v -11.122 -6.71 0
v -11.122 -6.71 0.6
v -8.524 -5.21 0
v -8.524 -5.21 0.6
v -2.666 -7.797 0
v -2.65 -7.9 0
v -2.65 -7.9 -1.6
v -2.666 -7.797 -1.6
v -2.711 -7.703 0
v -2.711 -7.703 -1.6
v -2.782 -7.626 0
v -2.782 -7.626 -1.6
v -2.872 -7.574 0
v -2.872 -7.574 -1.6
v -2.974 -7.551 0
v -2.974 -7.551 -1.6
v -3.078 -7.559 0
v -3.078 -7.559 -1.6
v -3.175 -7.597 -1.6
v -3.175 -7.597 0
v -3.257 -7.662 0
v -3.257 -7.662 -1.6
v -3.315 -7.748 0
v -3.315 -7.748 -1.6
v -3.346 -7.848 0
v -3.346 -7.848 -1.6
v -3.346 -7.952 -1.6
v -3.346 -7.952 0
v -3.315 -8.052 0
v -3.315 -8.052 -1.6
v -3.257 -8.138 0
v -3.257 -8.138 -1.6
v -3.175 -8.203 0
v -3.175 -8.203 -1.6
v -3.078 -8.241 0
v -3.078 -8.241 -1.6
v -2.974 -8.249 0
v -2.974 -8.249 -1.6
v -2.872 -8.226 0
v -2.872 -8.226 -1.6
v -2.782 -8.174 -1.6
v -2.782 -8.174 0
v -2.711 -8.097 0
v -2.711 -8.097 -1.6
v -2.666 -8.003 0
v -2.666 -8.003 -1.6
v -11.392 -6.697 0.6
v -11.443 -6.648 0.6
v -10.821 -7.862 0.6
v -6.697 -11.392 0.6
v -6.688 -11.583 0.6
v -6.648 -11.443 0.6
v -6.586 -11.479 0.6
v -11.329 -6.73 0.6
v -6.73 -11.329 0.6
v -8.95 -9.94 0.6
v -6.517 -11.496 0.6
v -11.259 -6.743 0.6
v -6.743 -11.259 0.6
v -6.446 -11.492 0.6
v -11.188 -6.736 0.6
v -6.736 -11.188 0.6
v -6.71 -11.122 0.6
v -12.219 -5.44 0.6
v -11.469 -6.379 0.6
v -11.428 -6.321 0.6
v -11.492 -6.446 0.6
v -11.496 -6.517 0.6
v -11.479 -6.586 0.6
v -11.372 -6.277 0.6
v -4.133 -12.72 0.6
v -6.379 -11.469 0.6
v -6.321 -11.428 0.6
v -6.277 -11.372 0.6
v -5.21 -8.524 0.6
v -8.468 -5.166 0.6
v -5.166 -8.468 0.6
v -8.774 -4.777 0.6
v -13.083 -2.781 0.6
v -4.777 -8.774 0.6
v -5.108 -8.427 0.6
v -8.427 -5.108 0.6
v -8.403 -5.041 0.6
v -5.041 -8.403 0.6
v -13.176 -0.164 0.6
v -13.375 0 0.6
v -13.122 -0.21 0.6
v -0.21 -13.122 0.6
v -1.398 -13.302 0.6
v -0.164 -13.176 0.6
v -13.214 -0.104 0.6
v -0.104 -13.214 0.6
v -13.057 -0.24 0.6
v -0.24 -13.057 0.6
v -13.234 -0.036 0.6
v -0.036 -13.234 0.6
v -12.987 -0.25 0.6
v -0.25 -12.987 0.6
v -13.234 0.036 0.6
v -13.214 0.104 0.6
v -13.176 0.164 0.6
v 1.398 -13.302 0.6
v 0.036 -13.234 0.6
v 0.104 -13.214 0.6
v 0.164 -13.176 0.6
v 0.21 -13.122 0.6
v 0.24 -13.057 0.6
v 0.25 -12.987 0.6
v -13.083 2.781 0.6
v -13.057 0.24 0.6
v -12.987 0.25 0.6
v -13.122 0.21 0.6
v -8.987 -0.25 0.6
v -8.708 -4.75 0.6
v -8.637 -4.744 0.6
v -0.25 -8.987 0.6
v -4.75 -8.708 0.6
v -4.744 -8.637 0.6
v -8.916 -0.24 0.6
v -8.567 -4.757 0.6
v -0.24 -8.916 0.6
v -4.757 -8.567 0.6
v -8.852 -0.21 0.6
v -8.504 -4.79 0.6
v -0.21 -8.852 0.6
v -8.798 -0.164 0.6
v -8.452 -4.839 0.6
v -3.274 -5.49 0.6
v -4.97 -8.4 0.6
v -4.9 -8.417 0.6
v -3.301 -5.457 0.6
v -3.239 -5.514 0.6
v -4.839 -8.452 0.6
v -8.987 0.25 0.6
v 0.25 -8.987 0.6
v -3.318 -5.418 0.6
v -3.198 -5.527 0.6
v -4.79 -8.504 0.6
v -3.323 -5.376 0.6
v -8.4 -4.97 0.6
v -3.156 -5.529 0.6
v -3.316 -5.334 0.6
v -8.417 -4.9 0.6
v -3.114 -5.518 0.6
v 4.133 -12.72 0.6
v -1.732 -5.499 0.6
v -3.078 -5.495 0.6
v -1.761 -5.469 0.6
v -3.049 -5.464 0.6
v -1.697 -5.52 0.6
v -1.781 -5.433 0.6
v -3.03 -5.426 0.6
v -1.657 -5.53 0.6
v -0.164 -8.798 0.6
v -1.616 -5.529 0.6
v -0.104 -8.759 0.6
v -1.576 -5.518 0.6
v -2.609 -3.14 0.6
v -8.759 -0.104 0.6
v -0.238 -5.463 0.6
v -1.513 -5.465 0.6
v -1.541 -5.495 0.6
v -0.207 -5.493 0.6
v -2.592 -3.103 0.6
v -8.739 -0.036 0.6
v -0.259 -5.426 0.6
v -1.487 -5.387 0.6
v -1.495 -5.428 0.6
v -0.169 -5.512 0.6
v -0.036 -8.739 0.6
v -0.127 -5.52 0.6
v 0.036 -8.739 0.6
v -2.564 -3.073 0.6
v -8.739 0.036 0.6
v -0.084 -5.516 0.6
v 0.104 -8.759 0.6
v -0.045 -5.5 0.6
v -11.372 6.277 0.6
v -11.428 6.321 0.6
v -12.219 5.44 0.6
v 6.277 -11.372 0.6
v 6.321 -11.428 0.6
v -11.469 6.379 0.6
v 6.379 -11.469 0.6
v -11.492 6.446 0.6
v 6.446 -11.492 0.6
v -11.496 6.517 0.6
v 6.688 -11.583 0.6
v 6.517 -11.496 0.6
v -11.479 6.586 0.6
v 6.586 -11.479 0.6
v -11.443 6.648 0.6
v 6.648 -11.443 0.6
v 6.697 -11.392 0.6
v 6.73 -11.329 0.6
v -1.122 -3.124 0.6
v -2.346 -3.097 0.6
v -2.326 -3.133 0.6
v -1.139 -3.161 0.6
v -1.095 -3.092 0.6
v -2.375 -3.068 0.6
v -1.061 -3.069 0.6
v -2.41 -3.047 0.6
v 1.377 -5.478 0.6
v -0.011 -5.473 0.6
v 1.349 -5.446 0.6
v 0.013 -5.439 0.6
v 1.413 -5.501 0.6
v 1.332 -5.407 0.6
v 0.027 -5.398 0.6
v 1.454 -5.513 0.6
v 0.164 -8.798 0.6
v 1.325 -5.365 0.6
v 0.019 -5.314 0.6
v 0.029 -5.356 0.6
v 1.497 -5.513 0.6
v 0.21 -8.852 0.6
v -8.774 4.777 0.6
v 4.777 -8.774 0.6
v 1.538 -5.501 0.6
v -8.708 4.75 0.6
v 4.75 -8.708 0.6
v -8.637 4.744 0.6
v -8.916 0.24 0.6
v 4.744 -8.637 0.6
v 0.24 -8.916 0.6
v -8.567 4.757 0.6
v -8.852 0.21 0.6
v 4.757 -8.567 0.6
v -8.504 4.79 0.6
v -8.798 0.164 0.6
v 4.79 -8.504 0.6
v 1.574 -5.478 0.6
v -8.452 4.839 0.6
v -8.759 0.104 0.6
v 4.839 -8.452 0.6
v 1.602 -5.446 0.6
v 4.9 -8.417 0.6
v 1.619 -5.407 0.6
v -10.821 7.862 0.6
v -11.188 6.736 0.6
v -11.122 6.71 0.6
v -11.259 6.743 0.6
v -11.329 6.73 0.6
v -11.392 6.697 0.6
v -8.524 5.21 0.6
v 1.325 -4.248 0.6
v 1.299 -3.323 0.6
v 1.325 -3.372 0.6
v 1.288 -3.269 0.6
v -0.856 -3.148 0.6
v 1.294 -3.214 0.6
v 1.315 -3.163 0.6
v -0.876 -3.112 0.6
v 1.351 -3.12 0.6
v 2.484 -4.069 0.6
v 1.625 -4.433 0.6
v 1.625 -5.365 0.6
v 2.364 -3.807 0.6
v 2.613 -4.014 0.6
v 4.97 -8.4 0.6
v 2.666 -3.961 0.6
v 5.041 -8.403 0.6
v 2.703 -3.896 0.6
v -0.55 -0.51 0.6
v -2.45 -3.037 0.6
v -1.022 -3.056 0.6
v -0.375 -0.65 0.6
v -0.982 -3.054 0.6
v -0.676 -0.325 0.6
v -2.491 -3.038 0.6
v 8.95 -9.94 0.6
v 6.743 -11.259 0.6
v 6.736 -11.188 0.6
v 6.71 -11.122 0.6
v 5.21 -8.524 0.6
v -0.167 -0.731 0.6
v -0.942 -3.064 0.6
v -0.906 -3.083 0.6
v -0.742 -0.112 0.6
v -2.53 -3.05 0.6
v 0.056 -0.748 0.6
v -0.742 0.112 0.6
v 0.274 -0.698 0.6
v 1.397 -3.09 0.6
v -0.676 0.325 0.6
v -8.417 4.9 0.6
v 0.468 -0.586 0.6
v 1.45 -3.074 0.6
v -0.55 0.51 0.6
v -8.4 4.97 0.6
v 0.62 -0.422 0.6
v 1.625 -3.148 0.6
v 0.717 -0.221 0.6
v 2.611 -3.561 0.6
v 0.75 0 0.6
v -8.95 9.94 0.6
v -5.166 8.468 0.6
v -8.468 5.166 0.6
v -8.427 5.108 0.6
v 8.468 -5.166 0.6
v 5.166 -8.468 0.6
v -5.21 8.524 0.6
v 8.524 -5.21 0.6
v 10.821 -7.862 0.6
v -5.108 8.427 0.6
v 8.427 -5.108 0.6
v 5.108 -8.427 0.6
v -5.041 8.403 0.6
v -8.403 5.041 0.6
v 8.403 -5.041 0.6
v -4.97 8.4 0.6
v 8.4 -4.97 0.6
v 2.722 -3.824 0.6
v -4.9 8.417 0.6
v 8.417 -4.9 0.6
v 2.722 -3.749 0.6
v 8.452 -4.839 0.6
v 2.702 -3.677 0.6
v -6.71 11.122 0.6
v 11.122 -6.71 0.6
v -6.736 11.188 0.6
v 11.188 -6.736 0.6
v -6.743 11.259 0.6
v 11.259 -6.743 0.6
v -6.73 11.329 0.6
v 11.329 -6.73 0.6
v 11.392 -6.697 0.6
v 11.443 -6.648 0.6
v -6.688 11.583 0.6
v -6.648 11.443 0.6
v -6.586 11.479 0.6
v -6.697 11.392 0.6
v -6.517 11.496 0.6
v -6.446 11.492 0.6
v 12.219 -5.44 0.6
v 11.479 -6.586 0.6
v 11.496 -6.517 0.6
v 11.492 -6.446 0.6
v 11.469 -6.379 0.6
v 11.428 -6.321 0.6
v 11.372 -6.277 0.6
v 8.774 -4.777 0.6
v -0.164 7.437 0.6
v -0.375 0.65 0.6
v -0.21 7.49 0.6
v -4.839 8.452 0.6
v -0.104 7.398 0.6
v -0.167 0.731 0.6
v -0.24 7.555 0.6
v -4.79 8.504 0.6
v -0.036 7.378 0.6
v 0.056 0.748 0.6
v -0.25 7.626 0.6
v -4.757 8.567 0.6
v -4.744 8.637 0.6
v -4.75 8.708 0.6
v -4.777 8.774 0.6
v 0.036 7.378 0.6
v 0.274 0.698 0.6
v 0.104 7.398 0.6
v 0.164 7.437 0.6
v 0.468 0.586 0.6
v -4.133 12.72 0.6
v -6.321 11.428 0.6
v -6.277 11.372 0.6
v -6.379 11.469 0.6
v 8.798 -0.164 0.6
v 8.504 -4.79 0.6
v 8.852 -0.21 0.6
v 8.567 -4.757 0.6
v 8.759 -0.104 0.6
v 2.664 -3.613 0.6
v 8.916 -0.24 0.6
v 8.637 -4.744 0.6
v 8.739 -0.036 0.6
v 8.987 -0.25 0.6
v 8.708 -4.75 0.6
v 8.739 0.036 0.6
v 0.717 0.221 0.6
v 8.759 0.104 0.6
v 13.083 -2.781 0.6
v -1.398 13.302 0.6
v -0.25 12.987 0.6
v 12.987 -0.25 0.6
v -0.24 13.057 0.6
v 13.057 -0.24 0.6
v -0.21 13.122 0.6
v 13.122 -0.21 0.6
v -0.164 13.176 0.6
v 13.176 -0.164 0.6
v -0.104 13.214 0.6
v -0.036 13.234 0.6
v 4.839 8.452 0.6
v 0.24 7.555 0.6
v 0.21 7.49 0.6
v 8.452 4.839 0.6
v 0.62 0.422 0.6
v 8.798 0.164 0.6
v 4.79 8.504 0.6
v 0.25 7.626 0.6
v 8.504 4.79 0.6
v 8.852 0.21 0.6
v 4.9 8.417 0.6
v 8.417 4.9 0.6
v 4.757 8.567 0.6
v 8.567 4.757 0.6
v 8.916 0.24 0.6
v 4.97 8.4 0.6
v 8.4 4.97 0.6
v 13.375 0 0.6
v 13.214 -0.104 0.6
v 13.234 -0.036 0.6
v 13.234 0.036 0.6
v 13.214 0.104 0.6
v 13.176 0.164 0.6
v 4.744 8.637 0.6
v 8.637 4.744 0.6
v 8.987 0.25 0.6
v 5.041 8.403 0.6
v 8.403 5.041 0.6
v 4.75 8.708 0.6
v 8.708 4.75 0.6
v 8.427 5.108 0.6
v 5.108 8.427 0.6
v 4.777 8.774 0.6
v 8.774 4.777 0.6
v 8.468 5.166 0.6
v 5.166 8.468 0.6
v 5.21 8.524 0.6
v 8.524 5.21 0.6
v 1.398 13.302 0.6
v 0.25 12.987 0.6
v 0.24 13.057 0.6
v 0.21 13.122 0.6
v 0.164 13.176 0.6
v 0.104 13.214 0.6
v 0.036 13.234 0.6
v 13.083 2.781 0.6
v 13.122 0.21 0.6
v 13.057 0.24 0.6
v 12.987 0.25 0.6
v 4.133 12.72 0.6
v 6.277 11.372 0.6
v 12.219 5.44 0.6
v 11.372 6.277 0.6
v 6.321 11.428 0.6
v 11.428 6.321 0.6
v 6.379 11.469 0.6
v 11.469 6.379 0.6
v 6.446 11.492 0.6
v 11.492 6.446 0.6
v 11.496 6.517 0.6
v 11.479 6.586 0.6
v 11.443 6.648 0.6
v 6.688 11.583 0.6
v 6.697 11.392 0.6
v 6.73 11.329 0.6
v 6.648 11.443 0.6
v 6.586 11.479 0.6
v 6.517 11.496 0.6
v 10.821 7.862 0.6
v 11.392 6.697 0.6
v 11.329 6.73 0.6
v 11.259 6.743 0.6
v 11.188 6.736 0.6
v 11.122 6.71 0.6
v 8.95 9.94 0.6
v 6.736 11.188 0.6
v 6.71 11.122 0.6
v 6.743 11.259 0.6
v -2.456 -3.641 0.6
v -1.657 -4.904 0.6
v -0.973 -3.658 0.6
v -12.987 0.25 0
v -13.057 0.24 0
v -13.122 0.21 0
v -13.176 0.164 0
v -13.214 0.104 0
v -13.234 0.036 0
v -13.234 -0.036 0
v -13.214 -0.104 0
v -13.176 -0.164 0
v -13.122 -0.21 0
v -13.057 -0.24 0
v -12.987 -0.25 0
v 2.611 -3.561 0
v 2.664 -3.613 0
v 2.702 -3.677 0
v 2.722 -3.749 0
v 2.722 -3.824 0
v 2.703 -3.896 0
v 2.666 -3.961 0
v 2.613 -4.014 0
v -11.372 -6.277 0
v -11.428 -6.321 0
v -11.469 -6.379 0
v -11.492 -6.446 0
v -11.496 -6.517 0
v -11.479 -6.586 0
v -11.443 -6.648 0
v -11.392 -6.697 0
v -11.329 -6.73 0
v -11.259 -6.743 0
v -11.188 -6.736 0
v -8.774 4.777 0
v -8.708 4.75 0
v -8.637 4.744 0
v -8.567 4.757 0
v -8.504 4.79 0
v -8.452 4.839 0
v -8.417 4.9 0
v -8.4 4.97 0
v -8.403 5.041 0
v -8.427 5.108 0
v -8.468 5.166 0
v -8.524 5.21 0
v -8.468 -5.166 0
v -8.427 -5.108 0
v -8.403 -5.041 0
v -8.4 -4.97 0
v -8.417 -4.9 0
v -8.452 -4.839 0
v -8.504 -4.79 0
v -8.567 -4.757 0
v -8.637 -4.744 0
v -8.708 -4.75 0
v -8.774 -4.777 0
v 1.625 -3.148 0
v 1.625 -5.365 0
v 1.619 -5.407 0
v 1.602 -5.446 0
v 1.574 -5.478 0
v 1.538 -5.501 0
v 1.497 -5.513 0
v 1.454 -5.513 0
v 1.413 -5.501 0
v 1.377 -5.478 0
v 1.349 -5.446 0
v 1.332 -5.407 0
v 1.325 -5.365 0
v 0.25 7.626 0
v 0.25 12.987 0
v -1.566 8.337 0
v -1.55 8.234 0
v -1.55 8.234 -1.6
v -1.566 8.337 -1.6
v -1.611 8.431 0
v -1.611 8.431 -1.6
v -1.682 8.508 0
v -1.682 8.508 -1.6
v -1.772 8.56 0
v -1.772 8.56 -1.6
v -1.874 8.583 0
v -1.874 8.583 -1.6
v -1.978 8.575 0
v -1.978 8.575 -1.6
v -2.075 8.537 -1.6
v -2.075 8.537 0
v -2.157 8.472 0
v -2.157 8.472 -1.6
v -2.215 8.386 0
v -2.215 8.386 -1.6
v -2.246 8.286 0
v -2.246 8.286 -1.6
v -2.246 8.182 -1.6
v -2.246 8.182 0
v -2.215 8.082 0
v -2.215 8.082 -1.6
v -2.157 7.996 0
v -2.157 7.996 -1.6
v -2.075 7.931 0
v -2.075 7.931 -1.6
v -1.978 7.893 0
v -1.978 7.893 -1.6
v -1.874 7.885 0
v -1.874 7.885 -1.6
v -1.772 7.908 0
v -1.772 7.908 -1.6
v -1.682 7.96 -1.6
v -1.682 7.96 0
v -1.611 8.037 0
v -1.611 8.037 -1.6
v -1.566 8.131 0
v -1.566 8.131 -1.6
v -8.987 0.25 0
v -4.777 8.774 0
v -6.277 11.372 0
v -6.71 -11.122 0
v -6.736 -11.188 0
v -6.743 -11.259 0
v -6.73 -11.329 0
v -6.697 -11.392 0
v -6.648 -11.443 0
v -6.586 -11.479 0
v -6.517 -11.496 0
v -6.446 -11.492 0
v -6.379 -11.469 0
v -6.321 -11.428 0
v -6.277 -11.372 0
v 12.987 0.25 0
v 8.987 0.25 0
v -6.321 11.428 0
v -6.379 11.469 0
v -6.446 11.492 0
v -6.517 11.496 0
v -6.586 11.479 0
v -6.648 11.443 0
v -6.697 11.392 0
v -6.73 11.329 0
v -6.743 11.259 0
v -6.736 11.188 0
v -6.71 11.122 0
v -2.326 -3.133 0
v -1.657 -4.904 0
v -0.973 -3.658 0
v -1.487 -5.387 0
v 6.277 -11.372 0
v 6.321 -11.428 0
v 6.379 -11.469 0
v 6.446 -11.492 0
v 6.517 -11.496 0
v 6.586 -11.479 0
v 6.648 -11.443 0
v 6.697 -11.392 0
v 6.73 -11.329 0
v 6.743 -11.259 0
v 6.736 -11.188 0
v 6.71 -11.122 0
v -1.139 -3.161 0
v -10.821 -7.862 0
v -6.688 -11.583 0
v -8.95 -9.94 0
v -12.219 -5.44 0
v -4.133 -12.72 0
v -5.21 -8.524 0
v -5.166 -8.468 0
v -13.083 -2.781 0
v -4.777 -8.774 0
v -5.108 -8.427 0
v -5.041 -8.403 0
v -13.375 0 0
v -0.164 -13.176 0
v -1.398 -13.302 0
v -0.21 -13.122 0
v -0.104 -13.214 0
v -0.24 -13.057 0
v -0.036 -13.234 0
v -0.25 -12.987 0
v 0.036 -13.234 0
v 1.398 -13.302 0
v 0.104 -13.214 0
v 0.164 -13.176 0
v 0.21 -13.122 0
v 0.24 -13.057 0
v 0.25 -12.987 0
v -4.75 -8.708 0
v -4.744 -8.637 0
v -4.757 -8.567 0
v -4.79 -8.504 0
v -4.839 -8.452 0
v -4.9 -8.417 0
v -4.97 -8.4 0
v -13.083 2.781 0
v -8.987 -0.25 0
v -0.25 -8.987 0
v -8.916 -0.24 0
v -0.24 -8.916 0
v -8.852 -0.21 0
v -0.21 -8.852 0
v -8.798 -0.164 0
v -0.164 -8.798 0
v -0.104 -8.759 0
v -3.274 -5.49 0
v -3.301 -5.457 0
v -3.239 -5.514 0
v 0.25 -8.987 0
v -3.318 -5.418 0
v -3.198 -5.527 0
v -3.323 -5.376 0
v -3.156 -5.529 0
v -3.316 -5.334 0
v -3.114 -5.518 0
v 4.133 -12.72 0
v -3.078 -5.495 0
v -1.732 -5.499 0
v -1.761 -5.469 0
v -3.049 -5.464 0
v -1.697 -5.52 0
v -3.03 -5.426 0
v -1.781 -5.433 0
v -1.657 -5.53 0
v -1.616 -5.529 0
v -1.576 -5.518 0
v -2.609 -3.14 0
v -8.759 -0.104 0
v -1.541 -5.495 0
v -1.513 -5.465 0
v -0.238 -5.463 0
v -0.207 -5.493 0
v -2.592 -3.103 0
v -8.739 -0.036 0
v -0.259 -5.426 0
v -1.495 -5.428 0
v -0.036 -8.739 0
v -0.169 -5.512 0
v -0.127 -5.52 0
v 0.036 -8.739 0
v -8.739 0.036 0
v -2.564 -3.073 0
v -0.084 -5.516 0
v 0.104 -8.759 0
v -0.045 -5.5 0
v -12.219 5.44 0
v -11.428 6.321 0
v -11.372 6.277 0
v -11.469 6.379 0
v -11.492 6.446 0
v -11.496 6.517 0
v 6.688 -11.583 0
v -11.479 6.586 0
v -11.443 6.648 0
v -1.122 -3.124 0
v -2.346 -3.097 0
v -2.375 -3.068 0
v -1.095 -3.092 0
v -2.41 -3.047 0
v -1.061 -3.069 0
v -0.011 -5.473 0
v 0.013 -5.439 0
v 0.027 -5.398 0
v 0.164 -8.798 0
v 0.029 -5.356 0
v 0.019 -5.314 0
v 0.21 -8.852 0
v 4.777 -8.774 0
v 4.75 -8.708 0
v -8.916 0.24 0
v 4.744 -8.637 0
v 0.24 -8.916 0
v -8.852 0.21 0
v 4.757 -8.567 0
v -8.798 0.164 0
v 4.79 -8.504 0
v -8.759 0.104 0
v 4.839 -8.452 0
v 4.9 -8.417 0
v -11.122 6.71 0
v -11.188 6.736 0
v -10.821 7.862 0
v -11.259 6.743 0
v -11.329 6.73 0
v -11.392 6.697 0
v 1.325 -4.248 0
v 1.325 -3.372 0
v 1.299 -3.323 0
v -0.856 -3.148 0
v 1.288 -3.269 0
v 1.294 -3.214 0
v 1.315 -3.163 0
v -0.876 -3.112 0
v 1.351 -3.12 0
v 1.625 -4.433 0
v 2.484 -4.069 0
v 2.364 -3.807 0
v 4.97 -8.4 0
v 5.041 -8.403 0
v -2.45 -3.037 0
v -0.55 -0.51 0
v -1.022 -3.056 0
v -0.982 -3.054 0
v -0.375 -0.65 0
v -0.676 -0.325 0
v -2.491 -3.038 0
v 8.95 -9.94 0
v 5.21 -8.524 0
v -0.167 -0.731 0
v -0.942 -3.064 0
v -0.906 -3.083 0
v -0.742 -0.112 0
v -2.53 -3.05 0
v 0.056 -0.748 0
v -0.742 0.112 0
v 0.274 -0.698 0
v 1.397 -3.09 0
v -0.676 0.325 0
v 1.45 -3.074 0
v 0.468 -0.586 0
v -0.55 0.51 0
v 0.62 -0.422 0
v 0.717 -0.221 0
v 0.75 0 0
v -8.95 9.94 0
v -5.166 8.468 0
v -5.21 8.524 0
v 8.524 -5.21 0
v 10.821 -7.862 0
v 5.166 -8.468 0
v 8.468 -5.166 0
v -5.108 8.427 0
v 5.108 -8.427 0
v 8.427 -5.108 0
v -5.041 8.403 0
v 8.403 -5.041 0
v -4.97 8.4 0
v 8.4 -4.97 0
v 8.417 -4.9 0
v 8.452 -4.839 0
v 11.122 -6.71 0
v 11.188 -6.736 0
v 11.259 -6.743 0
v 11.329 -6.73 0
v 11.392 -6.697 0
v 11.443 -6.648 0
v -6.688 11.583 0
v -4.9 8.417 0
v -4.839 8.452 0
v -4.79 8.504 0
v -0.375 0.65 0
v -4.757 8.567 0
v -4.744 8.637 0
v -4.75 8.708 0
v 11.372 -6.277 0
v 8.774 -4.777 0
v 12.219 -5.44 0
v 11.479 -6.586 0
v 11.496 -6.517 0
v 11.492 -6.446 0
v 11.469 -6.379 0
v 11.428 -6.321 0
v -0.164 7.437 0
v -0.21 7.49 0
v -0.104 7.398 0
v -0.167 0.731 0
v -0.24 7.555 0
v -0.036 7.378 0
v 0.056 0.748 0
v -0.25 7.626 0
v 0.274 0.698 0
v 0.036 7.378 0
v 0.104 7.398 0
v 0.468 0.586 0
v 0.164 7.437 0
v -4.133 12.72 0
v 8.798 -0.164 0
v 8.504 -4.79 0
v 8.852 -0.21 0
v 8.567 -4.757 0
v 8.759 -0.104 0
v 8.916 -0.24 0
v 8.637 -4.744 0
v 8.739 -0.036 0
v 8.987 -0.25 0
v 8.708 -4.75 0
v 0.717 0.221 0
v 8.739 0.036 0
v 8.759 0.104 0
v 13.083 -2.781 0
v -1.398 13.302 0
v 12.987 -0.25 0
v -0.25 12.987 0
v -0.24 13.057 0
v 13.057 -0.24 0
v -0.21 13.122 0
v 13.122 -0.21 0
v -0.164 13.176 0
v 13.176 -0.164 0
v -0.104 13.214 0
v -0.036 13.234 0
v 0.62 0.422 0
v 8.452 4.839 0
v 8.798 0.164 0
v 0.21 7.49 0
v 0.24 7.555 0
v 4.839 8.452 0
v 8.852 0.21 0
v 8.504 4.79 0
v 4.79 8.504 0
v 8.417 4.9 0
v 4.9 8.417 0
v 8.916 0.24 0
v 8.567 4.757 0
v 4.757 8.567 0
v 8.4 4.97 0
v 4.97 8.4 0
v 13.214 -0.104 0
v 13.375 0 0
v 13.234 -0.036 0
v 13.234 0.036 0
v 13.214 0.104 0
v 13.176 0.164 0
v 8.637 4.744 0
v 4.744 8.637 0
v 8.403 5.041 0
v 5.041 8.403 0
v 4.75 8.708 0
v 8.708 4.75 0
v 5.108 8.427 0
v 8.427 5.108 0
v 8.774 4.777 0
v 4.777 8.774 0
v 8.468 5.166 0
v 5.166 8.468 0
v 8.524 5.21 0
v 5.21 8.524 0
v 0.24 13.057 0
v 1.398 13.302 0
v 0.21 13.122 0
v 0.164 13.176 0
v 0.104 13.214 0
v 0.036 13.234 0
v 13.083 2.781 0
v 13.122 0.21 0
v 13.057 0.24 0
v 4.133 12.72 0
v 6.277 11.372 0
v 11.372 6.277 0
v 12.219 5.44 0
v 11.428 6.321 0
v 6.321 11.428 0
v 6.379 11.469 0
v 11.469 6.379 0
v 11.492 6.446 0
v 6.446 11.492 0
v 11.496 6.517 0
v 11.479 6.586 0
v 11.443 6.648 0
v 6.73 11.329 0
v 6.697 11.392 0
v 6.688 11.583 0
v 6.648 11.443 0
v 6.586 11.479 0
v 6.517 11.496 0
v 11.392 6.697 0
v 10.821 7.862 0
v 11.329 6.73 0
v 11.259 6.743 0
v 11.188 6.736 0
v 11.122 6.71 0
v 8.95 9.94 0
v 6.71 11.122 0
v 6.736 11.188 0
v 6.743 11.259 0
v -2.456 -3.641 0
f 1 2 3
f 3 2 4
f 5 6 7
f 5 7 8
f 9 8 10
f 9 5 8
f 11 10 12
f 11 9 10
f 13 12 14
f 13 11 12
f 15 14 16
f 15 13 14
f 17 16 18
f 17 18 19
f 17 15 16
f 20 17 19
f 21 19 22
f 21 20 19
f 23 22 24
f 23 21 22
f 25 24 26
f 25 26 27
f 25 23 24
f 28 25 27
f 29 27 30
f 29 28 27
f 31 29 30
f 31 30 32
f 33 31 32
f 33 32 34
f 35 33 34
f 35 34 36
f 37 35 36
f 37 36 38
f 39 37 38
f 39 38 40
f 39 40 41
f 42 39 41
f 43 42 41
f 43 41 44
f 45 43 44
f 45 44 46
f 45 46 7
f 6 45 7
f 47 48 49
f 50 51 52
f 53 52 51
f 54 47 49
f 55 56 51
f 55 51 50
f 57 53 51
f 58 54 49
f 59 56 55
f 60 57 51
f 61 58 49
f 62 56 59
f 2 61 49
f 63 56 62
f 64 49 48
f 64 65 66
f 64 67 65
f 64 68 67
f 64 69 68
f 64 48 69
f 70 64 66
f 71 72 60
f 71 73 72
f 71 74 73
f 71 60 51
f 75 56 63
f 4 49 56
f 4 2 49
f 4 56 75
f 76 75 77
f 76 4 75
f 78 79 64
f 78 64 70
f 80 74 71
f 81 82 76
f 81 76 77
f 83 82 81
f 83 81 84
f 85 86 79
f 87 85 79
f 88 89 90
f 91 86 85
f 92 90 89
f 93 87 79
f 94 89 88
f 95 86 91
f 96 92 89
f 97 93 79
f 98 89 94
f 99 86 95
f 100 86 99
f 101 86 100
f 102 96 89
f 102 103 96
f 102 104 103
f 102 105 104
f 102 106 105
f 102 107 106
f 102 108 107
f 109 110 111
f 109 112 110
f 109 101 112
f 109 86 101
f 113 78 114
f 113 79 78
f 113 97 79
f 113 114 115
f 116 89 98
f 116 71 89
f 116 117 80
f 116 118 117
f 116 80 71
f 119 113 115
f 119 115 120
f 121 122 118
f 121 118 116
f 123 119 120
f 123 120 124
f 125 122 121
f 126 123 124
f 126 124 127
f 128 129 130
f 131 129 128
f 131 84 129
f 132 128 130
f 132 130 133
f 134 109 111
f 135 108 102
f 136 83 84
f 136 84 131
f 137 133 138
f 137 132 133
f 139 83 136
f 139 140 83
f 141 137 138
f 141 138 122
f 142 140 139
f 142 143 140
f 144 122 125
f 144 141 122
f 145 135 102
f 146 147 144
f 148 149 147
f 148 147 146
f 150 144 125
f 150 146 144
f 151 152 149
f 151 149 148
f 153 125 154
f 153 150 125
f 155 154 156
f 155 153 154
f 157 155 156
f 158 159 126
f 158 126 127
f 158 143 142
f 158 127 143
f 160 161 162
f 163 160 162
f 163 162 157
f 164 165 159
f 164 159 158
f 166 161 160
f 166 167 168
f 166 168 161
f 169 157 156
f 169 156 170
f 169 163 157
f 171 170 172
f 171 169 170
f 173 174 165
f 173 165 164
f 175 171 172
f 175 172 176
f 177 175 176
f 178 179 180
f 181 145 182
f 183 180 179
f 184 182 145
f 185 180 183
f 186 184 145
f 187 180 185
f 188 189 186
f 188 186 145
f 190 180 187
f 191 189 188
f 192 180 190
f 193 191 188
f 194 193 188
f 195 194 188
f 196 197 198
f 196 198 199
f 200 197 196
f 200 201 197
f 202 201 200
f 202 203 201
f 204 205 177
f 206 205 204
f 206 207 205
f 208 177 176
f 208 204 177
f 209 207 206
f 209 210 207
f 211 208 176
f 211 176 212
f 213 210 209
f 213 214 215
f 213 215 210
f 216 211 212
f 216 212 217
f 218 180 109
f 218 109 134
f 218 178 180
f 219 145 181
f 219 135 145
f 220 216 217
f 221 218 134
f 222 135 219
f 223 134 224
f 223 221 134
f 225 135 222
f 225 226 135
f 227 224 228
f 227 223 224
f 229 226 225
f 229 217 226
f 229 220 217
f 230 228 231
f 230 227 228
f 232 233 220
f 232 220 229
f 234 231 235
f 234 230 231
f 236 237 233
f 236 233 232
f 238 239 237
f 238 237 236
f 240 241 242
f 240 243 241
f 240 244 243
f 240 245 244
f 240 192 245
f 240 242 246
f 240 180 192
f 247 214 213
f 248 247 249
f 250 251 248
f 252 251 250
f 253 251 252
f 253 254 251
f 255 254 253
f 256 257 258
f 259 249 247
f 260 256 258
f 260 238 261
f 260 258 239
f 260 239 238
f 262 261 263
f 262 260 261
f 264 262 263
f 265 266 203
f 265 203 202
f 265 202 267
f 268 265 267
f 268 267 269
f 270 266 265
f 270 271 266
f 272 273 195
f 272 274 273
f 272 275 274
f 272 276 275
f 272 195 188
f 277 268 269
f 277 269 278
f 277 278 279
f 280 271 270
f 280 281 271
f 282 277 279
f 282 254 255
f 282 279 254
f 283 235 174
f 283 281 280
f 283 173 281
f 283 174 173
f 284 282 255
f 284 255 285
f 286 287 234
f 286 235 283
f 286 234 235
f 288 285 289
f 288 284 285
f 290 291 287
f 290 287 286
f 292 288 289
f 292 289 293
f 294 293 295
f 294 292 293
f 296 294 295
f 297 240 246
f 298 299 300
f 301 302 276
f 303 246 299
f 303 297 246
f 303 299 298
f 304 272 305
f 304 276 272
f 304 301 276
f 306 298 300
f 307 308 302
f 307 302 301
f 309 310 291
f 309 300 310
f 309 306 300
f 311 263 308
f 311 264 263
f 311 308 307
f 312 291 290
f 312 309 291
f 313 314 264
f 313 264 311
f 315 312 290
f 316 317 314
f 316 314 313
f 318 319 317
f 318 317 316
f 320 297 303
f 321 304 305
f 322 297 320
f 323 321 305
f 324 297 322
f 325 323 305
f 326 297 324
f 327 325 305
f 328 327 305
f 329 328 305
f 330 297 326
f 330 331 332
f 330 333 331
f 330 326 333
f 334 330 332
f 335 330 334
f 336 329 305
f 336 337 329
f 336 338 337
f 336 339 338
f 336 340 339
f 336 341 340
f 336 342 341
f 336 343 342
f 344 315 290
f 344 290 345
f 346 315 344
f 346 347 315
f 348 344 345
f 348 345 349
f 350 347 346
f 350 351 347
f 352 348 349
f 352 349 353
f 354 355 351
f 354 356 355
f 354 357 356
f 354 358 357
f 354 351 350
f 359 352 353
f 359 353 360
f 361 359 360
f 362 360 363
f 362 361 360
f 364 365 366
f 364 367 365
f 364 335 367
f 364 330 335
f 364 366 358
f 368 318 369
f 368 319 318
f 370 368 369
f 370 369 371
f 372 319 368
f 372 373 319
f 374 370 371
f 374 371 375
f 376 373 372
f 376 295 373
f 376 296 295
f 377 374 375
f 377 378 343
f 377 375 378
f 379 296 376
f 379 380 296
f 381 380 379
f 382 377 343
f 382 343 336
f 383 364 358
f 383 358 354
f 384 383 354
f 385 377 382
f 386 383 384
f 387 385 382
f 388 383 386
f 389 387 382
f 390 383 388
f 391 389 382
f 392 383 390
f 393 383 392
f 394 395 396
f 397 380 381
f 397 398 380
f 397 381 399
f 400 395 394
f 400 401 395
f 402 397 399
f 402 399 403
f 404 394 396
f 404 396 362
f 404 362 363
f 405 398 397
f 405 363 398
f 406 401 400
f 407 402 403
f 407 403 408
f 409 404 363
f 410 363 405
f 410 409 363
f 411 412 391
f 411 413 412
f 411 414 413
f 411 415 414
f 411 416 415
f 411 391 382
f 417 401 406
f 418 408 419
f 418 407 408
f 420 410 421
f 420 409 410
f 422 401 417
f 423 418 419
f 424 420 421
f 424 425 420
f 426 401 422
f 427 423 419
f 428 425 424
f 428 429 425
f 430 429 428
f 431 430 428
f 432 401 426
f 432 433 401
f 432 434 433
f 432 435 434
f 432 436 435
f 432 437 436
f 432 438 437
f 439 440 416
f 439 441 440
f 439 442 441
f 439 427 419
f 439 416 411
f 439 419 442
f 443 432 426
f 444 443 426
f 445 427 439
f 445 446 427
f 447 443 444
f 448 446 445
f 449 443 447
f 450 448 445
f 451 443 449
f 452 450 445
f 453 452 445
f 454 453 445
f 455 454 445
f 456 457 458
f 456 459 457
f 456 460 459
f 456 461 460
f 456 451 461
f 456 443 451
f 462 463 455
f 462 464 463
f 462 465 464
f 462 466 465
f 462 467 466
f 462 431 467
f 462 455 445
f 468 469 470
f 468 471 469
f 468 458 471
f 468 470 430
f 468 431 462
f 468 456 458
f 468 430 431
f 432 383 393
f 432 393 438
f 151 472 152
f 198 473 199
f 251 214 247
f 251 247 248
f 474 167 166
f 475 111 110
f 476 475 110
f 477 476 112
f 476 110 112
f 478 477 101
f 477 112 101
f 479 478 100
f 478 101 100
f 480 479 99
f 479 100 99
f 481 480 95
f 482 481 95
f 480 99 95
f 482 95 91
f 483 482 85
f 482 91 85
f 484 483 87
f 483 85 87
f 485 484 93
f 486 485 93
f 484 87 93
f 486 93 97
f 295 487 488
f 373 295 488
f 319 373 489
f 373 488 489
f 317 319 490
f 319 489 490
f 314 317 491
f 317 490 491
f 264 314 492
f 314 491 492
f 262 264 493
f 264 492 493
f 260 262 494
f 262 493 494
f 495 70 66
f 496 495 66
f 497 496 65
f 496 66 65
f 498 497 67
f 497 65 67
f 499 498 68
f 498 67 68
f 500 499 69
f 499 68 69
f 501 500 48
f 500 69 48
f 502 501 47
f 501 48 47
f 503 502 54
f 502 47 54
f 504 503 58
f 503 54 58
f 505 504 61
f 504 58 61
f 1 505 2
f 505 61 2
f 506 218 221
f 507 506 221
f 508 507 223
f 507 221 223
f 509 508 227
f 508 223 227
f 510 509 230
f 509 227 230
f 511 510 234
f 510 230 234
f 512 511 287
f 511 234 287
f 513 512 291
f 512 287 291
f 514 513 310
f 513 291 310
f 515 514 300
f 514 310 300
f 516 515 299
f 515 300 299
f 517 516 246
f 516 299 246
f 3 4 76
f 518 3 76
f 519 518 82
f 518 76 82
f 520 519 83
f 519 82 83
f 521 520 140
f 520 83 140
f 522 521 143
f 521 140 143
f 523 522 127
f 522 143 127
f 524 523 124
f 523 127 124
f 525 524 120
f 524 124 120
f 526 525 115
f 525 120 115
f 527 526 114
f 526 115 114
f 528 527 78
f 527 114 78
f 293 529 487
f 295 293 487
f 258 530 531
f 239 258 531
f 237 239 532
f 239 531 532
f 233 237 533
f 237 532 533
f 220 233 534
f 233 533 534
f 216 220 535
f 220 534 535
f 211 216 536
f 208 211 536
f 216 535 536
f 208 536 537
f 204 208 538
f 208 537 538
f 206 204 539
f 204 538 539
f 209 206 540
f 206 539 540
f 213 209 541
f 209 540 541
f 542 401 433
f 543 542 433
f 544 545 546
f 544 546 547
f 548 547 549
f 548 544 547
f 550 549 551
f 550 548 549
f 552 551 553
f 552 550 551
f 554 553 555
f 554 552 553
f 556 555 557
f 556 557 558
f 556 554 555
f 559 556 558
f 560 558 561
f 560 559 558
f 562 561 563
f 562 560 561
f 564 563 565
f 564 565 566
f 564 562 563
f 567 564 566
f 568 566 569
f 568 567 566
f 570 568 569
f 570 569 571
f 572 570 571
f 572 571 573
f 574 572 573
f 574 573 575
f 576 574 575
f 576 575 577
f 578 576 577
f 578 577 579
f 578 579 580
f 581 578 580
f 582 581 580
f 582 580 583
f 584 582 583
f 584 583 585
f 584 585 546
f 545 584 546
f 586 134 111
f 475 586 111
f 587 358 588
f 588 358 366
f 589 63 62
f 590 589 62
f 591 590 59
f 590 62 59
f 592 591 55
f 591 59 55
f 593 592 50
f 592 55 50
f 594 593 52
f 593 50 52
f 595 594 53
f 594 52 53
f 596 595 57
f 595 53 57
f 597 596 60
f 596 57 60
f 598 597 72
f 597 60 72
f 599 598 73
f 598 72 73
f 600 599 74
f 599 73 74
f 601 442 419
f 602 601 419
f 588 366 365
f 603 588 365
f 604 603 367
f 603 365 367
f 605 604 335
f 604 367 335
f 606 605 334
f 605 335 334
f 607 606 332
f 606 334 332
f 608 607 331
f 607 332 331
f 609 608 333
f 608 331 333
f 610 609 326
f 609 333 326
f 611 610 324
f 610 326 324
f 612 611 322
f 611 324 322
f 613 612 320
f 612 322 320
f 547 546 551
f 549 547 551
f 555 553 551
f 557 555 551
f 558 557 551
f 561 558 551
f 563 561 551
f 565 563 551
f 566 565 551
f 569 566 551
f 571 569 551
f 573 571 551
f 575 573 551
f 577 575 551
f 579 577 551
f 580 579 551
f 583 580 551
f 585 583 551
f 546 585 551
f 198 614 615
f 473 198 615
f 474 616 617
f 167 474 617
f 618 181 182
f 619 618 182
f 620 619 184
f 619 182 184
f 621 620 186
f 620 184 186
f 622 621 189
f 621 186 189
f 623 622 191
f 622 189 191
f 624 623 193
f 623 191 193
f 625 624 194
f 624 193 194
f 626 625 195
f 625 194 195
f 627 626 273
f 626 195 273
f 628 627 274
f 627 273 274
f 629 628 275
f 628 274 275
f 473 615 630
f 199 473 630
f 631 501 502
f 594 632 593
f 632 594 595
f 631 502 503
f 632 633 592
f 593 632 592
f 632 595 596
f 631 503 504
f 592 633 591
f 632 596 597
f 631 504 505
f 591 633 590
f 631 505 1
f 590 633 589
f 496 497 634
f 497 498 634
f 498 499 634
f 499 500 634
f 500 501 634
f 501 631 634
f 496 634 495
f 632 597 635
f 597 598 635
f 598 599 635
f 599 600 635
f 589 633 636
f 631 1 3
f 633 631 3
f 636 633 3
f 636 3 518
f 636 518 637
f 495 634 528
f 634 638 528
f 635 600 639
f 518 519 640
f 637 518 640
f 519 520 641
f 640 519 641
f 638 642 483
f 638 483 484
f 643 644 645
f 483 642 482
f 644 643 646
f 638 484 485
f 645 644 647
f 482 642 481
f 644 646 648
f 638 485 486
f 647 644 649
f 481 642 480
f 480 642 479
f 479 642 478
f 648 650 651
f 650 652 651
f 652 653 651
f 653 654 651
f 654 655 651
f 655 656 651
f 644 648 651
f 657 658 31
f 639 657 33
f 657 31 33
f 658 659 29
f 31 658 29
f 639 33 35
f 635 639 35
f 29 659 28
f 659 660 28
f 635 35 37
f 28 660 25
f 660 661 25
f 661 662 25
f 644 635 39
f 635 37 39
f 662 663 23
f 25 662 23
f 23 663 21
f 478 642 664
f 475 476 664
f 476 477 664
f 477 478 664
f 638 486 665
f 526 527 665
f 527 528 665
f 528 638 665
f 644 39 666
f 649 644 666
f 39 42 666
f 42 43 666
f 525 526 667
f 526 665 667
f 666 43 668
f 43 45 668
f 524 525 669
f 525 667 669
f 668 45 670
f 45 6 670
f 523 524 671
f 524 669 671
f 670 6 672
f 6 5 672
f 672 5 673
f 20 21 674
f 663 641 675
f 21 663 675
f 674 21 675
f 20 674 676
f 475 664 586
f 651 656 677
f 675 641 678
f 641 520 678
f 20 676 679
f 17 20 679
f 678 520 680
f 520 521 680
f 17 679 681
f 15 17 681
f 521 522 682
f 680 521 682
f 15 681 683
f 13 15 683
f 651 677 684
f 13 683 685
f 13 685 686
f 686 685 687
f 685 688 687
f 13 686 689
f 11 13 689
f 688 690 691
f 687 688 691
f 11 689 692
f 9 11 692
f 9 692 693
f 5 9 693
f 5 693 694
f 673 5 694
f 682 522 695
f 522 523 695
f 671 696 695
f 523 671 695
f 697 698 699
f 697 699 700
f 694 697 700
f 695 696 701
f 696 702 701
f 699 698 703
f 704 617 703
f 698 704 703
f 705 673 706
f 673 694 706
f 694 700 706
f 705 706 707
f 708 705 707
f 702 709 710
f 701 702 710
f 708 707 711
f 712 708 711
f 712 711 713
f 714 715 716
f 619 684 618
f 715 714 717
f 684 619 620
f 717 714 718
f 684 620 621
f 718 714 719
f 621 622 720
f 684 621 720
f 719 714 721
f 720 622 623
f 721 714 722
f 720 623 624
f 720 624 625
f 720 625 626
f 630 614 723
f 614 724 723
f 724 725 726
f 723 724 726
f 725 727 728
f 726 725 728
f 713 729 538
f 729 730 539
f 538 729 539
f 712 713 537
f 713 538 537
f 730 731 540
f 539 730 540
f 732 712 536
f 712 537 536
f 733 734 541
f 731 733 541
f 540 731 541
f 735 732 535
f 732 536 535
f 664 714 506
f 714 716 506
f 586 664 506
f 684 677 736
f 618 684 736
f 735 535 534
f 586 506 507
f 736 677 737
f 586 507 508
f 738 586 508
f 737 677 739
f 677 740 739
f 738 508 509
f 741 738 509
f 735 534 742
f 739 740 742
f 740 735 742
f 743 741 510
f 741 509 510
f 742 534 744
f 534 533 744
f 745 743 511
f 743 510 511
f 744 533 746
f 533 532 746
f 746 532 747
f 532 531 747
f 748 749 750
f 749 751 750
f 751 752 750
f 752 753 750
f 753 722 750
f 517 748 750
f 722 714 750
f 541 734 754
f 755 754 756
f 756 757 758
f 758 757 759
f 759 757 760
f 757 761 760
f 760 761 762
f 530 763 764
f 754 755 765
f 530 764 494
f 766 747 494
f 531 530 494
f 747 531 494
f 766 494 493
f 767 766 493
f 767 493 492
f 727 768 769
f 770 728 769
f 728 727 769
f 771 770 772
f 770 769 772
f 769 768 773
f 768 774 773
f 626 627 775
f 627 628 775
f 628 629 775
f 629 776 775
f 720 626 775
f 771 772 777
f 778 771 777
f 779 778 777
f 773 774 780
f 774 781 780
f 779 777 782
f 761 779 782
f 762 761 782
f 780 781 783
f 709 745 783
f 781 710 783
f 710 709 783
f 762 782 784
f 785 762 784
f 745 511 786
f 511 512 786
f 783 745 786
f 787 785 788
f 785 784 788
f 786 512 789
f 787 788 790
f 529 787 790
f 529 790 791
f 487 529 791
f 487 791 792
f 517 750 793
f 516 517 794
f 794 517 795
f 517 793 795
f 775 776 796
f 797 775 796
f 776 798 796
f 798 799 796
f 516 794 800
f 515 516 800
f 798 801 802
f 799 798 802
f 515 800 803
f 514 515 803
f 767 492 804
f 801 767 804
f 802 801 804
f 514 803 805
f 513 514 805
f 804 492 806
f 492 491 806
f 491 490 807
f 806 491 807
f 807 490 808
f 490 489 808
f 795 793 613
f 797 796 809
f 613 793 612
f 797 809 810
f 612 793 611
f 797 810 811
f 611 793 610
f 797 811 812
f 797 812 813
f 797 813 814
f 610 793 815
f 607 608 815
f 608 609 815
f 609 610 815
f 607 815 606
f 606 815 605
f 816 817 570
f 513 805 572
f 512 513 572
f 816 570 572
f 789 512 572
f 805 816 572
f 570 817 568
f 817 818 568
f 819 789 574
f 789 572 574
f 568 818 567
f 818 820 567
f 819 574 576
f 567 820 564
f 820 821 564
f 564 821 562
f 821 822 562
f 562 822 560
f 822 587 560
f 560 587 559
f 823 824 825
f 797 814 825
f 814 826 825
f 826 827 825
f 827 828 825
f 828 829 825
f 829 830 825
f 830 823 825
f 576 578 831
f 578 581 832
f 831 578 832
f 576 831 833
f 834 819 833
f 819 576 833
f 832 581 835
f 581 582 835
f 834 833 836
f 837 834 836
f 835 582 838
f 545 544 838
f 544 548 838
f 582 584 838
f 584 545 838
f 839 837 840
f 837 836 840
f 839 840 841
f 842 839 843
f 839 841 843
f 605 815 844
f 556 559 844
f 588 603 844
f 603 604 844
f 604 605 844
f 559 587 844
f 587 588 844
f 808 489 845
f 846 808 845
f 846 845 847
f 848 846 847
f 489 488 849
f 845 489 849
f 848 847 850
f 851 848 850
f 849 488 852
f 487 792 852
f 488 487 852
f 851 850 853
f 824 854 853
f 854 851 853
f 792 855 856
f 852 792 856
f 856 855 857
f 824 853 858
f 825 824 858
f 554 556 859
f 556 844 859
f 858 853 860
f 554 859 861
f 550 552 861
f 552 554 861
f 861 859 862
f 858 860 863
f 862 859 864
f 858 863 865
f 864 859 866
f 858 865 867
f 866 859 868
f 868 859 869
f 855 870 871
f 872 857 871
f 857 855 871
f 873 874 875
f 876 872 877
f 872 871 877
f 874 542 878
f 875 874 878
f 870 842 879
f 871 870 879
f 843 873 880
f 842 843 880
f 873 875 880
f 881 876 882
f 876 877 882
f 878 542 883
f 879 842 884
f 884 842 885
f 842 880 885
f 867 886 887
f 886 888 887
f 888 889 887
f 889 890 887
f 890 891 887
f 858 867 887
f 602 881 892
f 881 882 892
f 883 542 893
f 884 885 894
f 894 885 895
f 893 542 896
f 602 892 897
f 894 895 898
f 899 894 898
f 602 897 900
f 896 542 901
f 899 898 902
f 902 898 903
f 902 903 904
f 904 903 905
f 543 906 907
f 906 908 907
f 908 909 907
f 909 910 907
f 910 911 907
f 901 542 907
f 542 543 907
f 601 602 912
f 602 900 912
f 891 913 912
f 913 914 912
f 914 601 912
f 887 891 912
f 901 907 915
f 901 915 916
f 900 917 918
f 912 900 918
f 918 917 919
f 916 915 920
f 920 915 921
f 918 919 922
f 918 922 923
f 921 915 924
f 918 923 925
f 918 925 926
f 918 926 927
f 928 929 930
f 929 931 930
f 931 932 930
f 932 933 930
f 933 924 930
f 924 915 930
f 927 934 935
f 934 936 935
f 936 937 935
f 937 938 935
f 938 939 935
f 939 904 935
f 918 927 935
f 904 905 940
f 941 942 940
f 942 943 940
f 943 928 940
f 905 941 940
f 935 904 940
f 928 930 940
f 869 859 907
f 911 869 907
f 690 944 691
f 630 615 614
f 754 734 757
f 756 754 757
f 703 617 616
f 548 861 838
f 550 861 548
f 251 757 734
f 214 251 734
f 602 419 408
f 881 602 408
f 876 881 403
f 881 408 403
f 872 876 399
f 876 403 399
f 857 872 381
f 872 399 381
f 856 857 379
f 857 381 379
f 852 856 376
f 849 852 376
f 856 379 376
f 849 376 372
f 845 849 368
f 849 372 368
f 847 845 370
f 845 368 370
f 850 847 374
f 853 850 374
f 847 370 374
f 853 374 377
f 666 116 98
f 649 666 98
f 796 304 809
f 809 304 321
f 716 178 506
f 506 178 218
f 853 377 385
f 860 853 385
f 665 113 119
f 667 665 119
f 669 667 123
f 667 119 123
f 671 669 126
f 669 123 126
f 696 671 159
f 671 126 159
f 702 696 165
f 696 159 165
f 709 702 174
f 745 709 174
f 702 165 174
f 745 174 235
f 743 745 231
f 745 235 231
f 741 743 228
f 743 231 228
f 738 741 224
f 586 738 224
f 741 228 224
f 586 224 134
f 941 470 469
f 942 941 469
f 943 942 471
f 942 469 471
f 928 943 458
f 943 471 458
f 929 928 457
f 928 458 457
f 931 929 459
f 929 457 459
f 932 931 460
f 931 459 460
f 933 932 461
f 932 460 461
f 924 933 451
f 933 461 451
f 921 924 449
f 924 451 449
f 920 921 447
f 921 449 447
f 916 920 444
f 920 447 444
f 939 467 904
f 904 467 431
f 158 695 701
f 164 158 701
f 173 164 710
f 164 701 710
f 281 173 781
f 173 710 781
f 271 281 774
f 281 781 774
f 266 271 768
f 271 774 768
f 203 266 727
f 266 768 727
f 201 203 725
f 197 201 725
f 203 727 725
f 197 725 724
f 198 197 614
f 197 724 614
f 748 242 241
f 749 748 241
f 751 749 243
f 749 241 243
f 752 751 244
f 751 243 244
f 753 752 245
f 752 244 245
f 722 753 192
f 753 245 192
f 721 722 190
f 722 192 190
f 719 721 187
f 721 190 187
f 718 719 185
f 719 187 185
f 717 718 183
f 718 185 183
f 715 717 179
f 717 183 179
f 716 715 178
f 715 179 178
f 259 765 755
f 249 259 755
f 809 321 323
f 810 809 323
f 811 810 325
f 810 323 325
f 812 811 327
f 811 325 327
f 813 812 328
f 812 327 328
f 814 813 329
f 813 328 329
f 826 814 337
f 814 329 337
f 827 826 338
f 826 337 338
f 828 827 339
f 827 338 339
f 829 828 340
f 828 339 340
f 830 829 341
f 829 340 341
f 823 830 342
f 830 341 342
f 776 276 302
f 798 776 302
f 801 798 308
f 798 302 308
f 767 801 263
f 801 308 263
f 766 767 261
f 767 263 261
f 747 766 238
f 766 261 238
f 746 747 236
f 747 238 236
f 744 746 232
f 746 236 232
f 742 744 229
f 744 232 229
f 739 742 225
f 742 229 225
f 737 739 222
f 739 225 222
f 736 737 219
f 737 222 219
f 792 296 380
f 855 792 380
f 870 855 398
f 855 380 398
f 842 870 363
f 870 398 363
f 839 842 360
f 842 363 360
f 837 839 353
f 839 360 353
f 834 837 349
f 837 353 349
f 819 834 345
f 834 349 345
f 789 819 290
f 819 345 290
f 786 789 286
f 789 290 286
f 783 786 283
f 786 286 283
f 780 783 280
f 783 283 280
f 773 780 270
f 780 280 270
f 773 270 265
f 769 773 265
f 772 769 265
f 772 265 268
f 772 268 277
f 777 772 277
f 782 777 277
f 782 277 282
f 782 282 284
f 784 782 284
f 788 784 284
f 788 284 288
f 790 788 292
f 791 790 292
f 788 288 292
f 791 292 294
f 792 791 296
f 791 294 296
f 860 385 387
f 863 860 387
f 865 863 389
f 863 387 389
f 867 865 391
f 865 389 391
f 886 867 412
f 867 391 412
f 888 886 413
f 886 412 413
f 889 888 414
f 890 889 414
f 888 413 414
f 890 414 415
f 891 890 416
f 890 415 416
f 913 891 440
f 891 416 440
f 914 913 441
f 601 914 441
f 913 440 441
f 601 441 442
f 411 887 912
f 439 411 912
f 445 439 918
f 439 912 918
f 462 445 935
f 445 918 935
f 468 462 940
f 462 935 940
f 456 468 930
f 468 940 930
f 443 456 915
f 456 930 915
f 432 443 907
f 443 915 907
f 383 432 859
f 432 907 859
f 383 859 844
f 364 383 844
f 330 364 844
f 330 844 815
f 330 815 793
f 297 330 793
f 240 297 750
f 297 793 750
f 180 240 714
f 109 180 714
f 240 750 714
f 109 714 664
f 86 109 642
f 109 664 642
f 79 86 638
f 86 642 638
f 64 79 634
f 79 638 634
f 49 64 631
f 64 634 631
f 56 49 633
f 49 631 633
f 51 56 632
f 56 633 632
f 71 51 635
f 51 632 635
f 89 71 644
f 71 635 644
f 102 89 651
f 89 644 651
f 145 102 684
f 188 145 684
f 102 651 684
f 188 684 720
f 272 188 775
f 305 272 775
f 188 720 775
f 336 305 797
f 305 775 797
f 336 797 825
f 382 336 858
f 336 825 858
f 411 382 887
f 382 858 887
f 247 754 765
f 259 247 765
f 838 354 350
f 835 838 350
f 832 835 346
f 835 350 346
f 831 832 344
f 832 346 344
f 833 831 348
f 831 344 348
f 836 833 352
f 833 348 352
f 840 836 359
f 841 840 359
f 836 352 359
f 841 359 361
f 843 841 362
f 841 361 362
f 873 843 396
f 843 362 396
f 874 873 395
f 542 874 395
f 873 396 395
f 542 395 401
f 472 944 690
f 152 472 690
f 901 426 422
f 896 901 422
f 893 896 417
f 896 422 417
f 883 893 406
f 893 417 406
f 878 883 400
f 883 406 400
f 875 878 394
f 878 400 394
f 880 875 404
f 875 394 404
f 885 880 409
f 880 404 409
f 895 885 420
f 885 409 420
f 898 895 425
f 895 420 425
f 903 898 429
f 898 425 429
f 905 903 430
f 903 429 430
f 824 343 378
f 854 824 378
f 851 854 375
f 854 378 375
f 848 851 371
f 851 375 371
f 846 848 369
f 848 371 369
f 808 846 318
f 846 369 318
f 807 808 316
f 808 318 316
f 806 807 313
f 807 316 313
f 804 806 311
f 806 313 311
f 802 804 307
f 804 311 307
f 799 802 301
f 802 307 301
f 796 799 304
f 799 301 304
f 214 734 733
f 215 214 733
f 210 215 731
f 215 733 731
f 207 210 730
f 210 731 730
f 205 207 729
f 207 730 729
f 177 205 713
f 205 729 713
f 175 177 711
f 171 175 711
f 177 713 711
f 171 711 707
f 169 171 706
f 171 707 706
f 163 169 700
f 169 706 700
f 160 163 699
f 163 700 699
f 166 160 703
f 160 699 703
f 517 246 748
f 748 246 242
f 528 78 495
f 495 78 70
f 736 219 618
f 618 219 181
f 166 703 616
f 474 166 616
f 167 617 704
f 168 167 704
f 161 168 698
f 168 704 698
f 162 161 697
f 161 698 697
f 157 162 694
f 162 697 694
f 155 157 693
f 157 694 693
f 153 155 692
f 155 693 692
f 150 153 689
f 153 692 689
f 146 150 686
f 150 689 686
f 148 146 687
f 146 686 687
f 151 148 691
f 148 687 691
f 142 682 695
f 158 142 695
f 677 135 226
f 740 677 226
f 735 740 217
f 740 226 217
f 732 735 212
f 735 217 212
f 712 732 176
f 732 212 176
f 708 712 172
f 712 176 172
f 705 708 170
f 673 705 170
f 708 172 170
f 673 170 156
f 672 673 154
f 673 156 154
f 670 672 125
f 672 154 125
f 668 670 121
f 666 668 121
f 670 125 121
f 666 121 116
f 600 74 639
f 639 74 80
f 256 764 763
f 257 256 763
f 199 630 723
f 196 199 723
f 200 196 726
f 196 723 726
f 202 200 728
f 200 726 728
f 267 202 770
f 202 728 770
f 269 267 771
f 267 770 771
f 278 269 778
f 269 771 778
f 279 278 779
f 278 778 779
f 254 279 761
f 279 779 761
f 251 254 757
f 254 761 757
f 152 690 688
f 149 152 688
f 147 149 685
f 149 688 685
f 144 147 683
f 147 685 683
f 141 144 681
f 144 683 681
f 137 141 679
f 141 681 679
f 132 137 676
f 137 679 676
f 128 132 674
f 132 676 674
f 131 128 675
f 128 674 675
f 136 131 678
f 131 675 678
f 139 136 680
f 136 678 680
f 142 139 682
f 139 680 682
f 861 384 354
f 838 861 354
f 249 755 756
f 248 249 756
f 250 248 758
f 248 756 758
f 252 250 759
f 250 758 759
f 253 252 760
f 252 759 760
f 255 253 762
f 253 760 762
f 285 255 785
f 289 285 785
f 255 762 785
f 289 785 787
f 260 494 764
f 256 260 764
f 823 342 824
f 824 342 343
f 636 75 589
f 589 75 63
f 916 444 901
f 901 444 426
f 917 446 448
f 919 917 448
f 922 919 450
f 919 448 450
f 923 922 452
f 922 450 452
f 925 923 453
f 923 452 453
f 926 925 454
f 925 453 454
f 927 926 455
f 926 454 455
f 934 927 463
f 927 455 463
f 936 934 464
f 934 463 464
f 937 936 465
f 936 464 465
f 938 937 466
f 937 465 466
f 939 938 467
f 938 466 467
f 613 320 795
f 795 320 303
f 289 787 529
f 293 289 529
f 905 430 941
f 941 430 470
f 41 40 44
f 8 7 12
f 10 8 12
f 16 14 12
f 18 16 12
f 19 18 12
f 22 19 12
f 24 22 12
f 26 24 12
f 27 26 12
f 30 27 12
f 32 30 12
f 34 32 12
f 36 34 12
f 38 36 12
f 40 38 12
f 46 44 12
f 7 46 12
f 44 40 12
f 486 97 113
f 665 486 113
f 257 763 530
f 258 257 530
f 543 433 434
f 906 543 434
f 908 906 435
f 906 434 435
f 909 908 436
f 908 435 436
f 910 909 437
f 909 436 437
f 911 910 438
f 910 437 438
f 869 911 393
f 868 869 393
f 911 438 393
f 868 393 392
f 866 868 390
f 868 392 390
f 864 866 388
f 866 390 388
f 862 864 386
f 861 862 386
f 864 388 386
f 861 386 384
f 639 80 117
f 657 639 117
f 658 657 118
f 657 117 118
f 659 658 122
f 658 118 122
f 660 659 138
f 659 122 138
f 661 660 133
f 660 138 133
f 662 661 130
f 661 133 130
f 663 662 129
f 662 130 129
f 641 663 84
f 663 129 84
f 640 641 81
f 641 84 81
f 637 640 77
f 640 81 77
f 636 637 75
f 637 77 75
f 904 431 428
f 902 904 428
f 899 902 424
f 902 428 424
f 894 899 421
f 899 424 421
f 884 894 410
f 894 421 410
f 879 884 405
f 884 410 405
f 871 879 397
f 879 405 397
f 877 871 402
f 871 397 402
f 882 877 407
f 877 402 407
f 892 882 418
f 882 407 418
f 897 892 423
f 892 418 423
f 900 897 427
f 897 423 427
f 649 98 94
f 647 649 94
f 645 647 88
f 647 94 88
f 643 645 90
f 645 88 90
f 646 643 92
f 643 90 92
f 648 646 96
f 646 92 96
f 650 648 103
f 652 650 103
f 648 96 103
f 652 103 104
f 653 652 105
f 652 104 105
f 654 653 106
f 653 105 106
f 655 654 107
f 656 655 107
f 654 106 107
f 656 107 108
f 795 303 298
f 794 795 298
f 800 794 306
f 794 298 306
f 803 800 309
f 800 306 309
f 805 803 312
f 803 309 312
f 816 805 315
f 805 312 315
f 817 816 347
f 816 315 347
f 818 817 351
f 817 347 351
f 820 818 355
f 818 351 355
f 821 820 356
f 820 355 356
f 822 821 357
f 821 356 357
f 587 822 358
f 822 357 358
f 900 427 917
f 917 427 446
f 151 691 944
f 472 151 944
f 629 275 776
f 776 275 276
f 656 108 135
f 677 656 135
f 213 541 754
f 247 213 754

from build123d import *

# Parameters (mm, degrees)
F0_R     = 13.375
F1_DEPTH = 0.6
F2_R     = 0.75
F3_DEPTH = 0.6
F4_R     = 0.35
F5_DEPTH = 2.2


with BuildPart() as f1:
    # F0 (on Top) → F1 (new body)
    with BuildSketch(Plane.XY):
        Circle(F0_R)
        with BuildLine():
            Line((-2.455603, -3.641186), (-3.03039, -5.425586))
            ThreePointArc((-3.03039, -5.425586), (-3.219156, -5.522371), (-3.315941, -5.333605))
            Line((-3.315941, -5.333605), (-2.609415, -3.140224))
            ThreePointArc((-2.609415, -3.140224), (-2.470382, -3.036261), (-2.326336, -3.133157))
            Line((-2.326336, -3.133157), (-1.656765, -4.903756))
            Line((-1.656765, -4.903756), (-1.138734, -3.161121))
            ThreePointArc((-1.138734, -3.161121), (-1.00206, -3.054032), (-0.855862, -3.147702))
            Line((-0.855862, -3.147702), (0.01888, -5.31412))
            ThreePointArc((0.01888, -5.31412), (-0.064049, -5.50937), (-0.2593, -5.426441))
            Line((-0.2593, -5.426441), (-0.973416, -3.657835))
            Line((-0.973416, -3.657835), (-1.487491, -5.387162))
            ThreePointArc((-1.487491, -5.387162), (-1.615532, -5.529433), (-1.78089, -5.433038))
            Line((-1.78089, -5.433038), (-2.455603, -3.641186))
        make_face(mode=Mode.SUBTRACT)
        with BuildLine():
            ThreePointArc((1.625497, -5.364779), (1.475497, -5.514779), (1.325497, -5.364779))
            Line((1.325497, -5.364779), (1.325497, -4.433364))
            Line((1.325497, -4.433364), (1.325497, -4.248424))
            Line((1.325497, -4.248424), (2.363726, -3.807202))
            Line((2.363726, -3.807202), (1.325497, -3.371863))
            ThreePointArc((1.325497, -3.371863), (1.302815, -3.187375), (1.450294, -3.074238))
            Line((1.450294, -3.074238), (1.625497, -3.147702))
            Line((1.625497, -3.147702), (2.61069, -3.560803))
            ThreePointArc((2.61069, -3.560803), (2.724561, -3.786736), (2.612869, -4.013755))
            Line((2.612869, -4.013755), (2.483792, -4.068609))
            Line((2.483792, -4.068609), (1.625497, -4.433364))
            Line((1.625497, -4.433364), (1.625497, -5.364779))
        make_face(mode=Mode.SUBTRACT)
    extrude(amount=F1_DEPTH)

    # F2 (on face) → F3 (cut, through all)
    with BuildSketch(Plane.XY.offset(0.6)):
        with BuildLine():
            ThreePointArc((-11.121827, 6.709865), (-11.463333, 6.618359), (-11.371827, 6.276852))
            Line((-11.371827, 6.276852), (-8.773751, 4.776852))
            ThreePointArc((-8.773751, 4.776852), (-8.432244, 4.868359), (-8.523751, 5.209865))
            Line((-8.523751, 5.209865), (-11.121827, 6.709865))
        make_face()
        with BuildLine():
            Line((-8.986717, 0.25), (-12.986717, 0.25))
            ThreePointArc((-12.986717, 0.25), (-13.236717, 0), (-12.986717, -0.25))
            Line((-12.986717, -0.25), (-8.986717, -0.25))
            ThreePointArc((-8.986717, -0.25), (-8.736717, 0), (-8.986717, 0.25))
        make_face()
        with BuildLine():
            ThreePointArc((-6.276852, 11.371827), (-6.618359, 11.463333), (-6.709865, 11.121827))
            Line((-6.709865, 11.121827), (-5.209865, 8.523751))
            ThreePointArc((-5.209865, 8.523751), (-4.868359, 8.432244), (-4.776852, 8.773751))
            Line((-4.776852, 8.773751), (-6.276852, 11.371827))
        make_face()
        with BuildLine():
            ThreePointArc((-0.25, 8.986717), (-0.176777, 9.163494), (0, 9.236717))
            ThreePointArc((0, 9.236717), (0.176777, 9.163494), (0.25, 8.986717))
            Line((0.25, 8.986717), (0.25, 12.986717))
            ThreePointArc((0.25, 12.986717), (0, 13.236717), (-0.25, 12.986717))
            Line((-0.25, 12.986717), (-0.25, 8.986717))
        make_face()
        with BuildLine():
            ThreePointArc((6.709865, 11.121827), (6.618359, 11.463333), (6.276852, 11.371827))
            Line((6.276852, 11.371827), (4.776852, 8.773751))
            ThreePointArc((4.776852, 8.773751), (4.868359, 8.432244), (5.209865, 8.523751))
            Line((5.209865, 8.523751), (6.709865, 11.121827))
        make_face()
        with BuildLine():
            ThreePointArc((11.371827, 6.276852), (11.463333, 6.618359), (11.121827, 6.709865))
            Line((11.121827, 6.709865), (8.523751, 5.209865))
            ThreePointArc((8.523751, 5.209865), (8.432244, 4.868359), (8.773751, 4.776852))
            Line((8.773751, 4.776852), (11.371827, 6.276852))
        make_face()
        with BuildLine():
            Line((8.986717, -0.25), (12.986717, -0.25))
            ThreePointArc((12.986717, -0.25), (13.236717, 0), (12.986717, 0.25))
            Line((12.986717, 0.25), (8.986717, 0.25))
            ThreePointArc((8.986717, 0.25), (8.736717, 0), (8.986717, -0.25))
        make_face()
        with BuildLine():
            ThreePointArc((11.121827, -6.709865), (11.463333, -6.618359), (11.371827, -6.276852))
            Line((11.371827, -6.276852), (8.773751, -4.776852))
            ThreePointArc((8.773751, -4.776852), (8.432244, -4.868359), (8.523751, -5.209865))
            Line((8.523751, -5.209865), (11.121827, -6.709865))
        make_face()
        with BuildLine():
            Line((-0.25, -8.986717), (-0.25, -12.986717))
            ThreePointArc((-0.25, -12.986717), (0, -13.236717), (0.25, -12.986717))
            Line((0.25, -12.986717), (0.25, -8.986717))
            ThreePointArc((0.25, -8.986717), (0, -8.736717), (-0.25, -8.986717))
        make_face()
        with BuildLine():
            ThreePointArc((6.276852, -11.371827), (6.618359, -11.463333), (6.709865, -11.121827))
            Line((6.709865, -11.121827), (5.209865, -8.523751))
            ThreePointArc((5.209865, -8.523751), (4.868359, -8.432244), (4.776852, -8.773751))
            Line((4.776852, -8.773751), (6.276852, -11.371827))
        make_face()
        with BuildLine():
            ThreePointArc((-6.709865, -11.121827), (-6.618359, -11.463333), (-6.276852, -11.371827))
            Line((-6.276852, -11.371827), (-4.776852, -8.773751))
            ThreePointArc((-4.776852, -8.773751), (-4.868359, -8.432244), (-5.209865, -8.523751))
            Line((-5.209865, -8.523751), (-6.709865, -11.121827))
        make_face()
        with BuildLine():
            ThreePointArc((-11.371827, -6.276852), (-11.463333, -6.618359), (-11.121827, -6.709865))
            Line((-11.121827, -6.709865), (-8.523751, -5.209865))
            ThreePointArc((-8.523751, -5.209865), (-8.432244, -4.868359), (-8.773751, -4.776852))
            Line((-8.773751, -4.776852), (-11.371827, -6.276852))
        make_face()
        Circle(F2_R)
        with BuildLine():
            ThreePointArc((0, 8.736717), (-0.176777, 8.80994), (-0.25, 8.986717))
            Line((-0.25, 8.986717), (-0.25, 7.62564))
            ThreePointArc((-0.25, 7.62564), (0, 7.37564), (0.25, 7.62564))
            Line((0.25, 7.62564), (0.25, 8.986717))
            ThreePointArc((0.25, 8.986717), (0.176777, 8.80994), (0, 8.736717))
        make_face()
        with BuildLine():
            Line((0, 8.986717), (0, 9.236717))
            ThreePointArc((0, 9.236717), (-0.176777, 9.163494), (-0.25, 8.986717))
            ThreePointArc((-0.25, 8.986717), (-0.176777, 8.80994), (0, 8.736717))
            Line((0, 8.736717), (0, 8.986717))
        make_face()
        with BuildLine():
            ThreePointArc((0.25, 8.986717), (0.176777, 9.163494), (0, 9.236717))
            Line((0, 9.236717), (0, 8.986717))
            Line((0, 8.986717), (0, 8.736717))
            ThreePointArc((0, 8.736717), (0.176777, 8.80994), (0.25, 8.986717))
        make_face()
    extrude(amount=-F3_DEPTH, mode=Mode.SUBTRACT)

    # F4 (on face) → F5 (join)
    with BuildSketch(Plane.XY.offset(0.6)):
        with Locations((-1.9, 8.234)):
            Circle(F4_R)
        with Locations((-3, -7.9)):
            Circle(F4_R)
    extrude(amount=-F5_DEPTH)


solid = f1.part
